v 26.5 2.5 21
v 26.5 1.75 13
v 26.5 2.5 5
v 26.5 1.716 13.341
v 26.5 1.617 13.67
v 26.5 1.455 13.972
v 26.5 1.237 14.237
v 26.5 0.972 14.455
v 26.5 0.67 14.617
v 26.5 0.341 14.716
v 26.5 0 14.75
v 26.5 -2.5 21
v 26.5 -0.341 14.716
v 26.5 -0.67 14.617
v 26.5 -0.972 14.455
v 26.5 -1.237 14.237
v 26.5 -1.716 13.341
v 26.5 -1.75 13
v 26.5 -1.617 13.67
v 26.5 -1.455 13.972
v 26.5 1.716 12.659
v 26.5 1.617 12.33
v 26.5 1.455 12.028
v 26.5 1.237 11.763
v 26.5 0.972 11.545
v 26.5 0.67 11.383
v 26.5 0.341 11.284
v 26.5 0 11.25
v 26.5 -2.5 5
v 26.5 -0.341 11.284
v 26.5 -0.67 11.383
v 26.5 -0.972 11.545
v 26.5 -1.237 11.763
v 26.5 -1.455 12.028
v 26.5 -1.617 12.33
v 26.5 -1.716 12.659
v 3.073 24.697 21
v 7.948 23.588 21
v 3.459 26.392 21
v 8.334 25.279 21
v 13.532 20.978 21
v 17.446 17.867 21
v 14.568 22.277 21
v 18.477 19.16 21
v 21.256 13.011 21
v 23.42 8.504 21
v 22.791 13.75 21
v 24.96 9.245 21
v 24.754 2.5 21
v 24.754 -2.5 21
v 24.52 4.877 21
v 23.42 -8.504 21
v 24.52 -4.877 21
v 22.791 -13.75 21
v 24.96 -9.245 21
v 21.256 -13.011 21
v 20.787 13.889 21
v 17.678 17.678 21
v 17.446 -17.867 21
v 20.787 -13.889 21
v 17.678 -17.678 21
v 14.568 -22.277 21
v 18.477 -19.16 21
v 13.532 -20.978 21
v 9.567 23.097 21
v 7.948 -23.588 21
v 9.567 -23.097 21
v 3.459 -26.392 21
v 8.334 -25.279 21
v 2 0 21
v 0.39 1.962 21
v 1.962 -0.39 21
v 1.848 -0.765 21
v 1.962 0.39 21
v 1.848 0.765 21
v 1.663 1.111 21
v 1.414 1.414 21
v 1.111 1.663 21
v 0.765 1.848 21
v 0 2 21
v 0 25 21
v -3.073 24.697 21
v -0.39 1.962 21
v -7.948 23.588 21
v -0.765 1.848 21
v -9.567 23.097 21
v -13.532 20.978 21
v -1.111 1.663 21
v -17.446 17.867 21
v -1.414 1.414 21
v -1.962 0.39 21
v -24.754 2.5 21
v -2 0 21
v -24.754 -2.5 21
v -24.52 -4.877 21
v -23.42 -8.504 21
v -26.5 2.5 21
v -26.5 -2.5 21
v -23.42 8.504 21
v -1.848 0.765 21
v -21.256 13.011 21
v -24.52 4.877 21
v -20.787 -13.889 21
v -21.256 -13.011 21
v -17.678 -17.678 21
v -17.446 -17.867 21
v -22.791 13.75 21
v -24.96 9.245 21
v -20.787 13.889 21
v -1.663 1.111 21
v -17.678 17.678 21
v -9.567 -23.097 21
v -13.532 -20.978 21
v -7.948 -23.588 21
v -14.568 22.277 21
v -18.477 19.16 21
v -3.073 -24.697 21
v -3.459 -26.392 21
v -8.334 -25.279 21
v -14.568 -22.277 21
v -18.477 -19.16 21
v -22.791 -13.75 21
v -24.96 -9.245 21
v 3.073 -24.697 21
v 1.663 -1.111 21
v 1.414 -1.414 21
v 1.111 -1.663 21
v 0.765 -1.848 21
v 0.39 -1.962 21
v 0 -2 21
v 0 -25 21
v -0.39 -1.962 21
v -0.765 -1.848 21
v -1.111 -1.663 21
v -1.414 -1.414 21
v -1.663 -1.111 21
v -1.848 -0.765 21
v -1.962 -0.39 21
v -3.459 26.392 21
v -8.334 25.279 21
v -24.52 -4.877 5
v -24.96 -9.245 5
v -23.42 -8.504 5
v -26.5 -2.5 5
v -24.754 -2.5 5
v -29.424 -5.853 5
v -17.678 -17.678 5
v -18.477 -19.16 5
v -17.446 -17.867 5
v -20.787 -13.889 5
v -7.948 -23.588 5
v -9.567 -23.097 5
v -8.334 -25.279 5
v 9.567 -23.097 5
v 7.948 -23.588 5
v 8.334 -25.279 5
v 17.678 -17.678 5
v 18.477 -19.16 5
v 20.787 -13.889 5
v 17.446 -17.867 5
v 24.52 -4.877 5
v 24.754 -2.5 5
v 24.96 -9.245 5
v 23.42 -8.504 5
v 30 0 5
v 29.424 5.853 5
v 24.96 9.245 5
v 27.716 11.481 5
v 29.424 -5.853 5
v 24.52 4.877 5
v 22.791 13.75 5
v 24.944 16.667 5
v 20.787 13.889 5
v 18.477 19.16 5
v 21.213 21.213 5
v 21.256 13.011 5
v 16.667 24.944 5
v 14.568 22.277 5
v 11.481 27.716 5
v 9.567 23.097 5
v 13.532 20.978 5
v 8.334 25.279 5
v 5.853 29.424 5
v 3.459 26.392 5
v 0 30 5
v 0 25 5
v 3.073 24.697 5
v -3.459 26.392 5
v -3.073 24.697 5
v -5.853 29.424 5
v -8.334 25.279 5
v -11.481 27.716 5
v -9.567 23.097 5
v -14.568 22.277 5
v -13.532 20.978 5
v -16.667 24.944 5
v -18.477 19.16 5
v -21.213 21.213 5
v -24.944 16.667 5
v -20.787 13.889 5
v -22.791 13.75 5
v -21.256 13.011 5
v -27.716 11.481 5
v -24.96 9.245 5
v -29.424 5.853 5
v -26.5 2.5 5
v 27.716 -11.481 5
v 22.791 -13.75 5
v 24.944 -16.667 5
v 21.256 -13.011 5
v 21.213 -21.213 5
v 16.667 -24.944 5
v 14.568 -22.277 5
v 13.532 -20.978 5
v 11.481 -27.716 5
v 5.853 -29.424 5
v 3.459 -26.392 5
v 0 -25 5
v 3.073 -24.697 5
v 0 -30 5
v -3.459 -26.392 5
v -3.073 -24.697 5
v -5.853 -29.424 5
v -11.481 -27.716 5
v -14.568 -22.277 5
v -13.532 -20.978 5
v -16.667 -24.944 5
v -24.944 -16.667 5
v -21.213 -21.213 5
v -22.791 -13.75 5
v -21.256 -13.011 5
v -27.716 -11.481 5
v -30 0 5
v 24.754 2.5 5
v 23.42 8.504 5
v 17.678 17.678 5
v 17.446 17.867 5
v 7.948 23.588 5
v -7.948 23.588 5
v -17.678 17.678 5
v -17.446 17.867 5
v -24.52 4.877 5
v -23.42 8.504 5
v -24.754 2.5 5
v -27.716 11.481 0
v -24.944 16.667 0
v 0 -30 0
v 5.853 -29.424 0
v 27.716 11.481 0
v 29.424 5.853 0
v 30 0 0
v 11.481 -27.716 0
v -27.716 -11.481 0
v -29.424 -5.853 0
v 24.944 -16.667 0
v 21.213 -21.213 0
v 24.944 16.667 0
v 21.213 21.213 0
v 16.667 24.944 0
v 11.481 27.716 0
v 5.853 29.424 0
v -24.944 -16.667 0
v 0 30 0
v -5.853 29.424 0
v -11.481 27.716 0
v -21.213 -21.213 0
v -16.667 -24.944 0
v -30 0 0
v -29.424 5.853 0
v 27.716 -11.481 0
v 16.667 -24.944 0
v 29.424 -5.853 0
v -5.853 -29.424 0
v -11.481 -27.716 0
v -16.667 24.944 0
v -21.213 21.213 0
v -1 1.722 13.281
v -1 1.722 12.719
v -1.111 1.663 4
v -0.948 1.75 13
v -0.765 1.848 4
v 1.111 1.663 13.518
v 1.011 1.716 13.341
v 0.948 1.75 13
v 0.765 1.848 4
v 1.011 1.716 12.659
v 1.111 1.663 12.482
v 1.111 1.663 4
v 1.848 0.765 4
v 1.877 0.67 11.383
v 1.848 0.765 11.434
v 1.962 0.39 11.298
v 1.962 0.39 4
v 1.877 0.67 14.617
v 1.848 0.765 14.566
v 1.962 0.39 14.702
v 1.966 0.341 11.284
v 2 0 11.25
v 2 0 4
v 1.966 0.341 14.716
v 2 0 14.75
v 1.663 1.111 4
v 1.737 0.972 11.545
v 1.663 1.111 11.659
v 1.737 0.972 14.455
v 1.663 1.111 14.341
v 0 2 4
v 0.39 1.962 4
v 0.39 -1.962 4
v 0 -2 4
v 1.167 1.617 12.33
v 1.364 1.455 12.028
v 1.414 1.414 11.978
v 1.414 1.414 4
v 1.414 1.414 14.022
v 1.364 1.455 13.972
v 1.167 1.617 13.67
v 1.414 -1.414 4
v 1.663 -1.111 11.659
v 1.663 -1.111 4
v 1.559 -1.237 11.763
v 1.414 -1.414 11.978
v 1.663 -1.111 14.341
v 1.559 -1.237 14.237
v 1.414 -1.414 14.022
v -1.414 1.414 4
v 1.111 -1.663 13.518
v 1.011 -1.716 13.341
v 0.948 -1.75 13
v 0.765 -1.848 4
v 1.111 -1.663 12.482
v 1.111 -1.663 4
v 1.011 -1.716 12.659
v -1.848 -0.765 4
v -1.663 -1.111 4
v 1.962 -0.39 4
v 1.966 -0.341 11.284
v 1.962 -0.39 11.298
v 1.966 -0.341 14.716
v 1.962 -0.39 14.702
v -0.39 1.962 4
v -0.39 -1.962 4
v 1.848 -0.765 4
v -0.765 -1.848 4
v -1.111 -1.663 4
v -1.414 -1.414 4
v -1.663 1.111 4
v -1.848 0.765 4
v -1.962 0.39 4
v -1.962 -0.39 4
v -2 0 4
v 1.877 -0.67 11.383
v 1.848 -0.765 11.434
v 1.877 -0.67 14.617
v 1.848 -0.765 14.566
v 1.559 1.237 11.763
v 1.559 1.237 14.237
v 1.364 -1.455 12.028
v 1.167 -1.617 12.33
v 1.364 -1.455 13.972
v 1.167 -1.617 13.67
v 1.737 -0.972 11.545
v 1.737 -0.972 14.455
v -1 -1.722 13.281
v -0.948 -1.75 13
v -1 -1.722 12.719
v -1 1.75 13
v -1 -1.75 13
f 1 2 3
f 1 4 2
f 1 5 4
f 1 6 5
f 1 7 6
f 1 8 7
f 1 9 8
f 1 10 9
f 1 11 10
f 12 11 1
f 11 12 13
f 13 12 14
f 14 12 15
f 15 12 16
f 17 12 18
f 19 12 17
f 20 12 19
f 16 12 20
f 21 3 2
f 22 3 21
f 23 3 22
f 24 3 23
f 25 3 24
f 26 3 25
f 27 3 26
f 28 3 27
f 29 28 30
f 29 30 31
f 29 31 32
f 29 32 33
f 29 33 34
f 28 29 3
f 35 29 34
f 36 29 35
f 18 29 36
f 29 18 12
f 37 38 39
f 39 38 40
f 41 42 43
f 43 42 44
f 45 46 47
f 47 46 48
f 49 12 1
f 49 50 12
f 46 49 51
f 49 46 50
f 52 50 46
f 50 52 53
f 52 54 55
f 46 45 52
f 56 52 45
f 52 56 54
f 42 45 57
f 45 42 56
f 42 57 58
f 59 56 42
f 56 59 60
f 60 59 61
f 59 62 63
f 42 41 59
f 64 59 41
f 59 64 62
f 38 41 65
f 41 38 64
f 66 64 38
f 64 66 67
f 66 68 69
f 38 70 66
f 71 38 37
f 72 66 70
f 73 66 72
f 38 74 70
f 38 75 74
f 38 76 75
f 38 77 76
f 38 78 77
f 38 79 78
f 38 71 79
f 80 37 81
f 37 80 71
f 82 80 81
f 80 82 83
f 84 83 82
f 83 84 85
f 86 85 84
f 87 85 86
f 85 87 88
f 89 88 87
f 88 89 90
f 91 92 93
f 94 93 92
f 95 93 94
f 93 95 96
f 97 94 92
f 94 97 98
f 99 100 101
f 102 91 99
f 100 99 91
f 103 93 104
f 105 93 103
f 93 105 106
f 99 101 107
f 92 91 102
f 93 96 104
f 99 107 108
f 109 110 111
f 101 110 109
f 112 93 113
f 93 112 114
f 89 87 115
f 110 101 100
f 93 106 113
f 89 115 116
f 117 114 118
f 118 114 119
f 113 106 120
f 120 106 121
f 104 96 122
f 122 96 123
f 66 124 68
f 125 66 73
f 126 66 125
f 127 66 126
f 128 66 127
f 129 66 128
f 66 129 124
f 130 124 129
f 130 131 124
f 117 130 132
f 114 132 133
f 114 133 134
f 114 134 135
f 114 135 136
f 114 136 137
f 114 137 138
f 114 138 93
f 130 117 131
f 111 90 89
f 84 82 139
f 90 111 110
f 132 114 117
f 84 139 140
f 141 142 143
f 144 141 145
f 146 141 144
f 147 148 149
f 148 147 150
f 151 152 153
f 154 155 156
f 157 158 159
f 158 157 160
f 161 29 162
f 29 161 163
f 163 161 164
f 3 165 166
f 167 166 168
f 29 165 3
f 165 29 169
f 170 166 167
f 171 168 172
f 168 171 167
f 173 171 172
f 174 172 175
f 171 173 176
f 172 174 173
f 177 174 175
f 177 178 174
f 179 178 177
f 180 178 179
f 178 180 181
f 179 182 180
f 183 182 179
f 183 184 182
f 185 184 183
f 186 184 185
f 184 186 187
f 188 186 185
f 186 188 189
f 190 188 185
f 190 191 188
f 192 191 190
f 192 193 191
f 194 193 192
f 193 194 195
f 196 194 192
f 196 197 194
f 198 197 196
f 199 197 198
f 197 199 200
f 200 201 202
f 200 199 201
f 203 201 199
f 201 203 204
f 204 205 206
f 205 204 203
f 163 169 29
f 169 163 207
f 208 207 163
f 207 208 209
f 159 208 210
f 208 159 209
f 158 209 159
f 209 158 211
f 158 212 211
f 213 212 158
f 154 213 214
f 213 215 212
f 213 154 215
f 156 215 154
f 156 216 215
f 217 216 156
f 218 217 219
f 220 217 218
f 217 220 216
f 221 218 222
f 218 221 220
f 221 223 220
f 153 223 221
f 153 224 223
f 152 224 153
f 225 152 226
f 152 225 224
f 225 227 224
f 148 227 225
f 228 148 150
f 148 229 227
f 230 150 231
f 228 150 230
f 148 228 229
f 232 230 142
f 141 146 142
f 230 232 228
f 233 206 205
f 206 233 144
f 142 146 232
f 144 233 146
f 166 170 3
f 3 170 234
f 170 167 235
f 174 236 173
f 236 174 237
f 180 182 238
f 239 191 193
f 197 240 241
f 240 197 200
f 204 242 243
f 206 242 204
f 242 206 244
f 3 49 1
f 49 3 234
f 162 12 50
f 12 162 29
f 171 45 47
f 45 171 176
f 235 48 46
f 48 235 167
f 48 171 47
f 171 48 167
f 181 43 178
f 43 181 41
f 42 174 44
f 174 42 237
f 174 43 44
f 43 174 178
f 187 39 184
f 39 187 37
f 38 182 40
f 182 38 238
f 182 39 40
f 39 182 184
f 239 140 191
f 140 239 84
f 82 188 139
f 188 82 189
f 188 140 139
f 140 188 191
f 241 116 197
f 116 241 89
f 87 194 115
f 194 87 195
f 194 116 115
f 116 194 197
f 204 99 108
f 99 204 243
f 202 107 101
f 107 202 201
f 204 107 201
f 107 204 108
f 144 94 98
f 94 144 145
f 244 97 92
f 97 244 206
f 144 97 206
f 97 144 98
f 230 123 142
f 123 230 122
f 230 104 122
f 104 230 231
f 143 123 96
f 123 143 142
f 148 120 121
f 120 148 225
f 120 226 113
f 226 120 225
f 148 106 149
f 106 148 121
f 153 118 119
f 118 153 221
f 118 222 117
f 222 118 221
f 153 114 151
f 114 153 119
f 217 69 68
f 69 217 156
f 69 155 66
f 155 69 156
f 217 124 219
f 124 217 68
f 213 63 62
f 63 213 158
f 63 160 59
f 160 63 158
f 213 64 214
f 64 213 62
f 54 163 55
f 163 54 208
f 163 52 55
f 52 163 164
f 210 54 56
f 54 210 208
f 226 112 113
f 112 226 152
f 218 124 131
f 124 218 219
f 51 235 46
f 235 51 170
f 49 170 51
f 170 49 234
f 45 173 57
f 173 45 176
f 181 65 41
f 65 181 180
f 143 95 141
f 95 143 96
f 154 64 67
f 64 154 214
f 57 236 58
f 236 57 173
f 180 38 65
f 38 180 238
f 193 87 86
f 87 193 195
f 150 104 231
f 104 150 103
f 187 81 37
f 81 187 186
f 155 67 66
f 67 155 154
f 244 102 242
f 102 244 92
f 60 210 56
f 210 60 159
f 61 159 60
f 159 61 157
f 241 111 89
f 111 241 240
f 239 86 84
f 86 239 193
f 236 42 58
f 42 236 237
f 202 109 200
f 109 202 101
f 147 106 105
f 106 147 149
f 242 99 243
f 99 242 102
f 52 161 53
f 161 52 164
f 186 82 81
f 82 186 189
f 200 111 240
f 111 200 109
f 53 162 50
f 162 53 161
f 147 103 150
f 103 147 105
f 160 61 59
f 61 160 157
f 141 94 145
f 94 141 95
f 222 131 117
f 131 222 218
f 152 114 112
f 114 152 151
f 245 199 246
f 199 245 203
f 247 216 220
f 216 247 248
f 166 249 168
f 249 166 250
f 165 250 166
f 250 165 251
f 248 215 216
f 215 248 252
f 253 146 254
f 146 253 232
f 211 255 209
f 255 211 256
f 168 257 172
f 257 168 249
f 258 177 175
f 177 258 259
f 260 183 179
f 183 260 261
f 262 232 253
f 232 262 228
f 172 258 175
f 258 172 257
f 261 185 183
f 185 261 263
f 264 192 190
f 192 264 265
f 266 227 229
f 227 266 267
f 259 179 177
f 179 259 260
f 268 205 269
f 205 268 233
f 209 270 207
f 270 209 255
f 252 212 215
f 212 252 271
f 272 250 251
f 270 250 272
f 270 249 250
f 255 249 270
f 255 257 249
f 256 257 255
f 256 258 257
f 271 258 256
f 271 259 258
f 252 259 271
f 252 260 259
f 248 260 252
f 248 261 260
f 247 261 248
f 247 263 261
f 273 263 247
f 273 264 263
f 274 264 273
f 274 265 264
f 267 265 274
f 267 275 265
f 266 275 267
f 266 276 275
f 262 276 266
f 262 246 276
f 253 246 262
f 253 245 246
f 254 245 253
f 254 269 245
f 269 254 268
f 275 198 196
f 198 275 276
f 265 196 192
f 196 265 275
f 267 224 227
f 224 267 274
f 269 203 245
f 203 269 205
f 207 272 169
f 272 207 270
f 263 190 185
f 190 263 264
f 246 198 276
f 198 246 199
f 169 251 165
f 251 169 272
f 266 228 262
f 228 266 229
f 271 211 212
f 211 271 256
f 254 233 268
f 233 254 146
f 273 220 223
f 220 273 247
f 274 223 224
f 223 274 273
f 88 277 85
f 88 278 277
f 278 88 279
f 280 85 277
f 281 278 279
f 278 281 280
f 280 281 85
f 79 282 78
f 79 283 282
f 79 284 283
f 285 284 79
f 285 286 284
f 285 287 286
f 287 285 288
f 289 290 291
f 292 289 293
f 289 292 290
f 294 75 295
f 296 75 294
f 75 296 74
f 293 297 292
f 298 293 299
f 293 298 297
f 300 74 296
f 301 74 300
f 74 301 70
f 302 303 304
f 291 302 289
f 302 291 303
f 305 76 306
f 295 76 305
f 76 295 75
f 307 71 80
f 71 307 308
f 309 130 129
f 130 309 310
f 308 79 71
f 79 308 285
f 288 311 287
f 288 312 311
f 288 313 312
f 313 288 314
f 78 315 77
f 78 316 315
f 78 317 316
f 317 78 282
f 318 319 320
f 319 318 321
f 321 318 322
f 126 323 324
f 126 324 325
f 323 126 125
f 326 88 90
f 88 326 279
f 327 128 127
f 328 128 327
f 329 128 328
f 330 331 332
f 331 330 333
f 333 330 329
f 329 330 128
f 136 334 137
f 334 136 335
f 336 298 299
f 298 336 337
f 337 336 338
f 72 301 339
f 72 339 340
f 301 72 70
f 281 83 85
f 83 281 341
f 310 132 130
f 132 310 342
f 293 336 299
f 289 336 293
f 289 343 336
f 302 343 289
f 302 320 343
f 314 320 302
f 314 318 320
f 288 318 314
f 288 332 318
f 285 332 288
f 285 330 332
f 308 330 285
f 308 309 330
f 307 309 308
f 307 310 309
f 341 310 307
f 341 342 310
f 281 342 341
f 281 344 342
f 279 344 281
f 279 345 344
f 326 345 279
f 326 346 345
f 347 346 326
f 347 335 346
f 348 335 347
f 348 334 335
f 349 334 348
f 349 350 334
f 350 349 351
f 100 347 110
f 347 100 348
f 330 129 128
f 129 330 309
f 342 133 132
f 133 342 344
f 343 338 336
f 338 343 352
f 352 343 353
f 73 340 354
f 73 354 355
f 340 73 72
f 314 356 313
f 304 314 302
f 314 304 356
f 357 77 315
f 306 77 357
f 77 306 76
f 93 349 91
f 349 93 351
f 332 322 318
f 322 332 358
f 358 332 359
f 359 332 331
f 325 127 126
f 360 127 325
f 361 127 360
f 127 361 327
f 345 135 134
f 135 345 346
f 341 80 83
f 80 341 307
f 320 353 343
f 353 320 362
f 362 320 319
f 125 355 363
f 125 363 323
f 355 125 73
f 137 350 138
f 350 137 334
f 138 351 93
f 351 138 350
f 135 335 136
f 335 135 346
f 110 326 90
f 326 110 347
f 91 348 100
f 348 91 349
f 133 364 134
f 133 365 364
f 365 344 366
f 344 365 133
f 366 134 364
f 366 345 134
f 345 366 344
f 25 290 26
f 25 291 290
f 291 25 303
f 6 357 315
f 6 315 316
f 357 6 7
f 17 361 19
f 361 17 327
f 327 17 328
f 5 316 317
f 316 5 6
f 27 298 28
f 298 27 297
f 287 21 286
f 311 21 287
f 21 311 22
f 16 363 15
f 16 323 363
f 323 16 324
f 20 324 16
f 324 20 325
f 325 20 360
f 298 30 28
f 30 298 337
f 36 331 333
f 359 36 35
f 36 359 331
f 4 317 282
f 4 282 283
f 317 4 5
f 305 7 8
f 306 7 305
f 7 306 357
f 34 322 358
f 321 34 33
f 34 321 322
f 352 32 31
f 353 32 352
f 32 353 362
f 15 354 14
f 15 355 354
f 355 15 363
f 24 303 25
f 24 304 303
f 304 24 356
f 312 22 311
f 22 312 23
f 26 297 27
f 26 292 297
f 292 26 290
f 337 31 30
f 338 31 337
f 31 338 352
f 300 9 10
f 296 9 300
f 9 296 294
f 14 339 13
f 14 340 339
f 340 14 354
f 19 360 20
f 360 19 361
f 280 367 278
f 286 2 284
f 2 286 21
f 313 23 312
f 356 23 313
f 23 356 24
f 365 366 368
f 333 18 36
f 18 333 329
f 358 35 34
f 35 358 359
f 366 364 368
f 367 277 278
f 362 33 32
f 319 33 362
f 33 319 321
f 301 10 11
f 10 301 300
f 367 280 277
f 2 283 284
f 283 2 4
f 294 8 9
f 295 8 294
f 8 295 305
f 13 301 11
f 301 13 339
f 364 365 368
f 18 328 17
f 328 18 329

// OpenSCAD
$fn = 32;

// ----------------------------------------------------------------------
// Control knob: skirt knob with grip ribs
// ----------------------------------------------------------------------

// --- parameters (mm) ---
skirt_d = 60;             // skirt diameter
skirt_t = 5;              // skirt thickness
rib_w = 5;                // grip rib width
rib_out = 2.5;            // grip rib radial protrusion
n_ribs = 14;              // number of grip ribs
knob_d = 50;              // knob body diameter
knob_h = 16;              // knob body height
bore_d = 4;               // shaft bore diameter
set_d = 3.5;              // set screw bore diameter

rib_step = 360 / n_ribs;  // rib angular step
total_h = skirt_t + knob_h;  // overall height

difference() {
  union() {
    translate([0, 0, skirt_t]) cylinder(h = knob_h, d = knob_d);
    cylinder(h = skirt_t, d = skirt_d);
    for (i = [0 : n_ribs - 1])
      rotate([0, 0, i * rib_step])
        translate([knob_d / 2 - 1, -rib_w / 2, skirt_t])
          cube([rib_out, rib_w, knob_h]);
  }
  translate([0, 0, skirt_t - 1]) cylinder(h = knob_h + 2, d = bore_d);
  translate([-1, 0, skirt_t + knob_h / 2]) rotate([0, 90, 0])
    cylinder(h = knob_d / 2 + bore_d / 2 + 2, d = set_d);
}
